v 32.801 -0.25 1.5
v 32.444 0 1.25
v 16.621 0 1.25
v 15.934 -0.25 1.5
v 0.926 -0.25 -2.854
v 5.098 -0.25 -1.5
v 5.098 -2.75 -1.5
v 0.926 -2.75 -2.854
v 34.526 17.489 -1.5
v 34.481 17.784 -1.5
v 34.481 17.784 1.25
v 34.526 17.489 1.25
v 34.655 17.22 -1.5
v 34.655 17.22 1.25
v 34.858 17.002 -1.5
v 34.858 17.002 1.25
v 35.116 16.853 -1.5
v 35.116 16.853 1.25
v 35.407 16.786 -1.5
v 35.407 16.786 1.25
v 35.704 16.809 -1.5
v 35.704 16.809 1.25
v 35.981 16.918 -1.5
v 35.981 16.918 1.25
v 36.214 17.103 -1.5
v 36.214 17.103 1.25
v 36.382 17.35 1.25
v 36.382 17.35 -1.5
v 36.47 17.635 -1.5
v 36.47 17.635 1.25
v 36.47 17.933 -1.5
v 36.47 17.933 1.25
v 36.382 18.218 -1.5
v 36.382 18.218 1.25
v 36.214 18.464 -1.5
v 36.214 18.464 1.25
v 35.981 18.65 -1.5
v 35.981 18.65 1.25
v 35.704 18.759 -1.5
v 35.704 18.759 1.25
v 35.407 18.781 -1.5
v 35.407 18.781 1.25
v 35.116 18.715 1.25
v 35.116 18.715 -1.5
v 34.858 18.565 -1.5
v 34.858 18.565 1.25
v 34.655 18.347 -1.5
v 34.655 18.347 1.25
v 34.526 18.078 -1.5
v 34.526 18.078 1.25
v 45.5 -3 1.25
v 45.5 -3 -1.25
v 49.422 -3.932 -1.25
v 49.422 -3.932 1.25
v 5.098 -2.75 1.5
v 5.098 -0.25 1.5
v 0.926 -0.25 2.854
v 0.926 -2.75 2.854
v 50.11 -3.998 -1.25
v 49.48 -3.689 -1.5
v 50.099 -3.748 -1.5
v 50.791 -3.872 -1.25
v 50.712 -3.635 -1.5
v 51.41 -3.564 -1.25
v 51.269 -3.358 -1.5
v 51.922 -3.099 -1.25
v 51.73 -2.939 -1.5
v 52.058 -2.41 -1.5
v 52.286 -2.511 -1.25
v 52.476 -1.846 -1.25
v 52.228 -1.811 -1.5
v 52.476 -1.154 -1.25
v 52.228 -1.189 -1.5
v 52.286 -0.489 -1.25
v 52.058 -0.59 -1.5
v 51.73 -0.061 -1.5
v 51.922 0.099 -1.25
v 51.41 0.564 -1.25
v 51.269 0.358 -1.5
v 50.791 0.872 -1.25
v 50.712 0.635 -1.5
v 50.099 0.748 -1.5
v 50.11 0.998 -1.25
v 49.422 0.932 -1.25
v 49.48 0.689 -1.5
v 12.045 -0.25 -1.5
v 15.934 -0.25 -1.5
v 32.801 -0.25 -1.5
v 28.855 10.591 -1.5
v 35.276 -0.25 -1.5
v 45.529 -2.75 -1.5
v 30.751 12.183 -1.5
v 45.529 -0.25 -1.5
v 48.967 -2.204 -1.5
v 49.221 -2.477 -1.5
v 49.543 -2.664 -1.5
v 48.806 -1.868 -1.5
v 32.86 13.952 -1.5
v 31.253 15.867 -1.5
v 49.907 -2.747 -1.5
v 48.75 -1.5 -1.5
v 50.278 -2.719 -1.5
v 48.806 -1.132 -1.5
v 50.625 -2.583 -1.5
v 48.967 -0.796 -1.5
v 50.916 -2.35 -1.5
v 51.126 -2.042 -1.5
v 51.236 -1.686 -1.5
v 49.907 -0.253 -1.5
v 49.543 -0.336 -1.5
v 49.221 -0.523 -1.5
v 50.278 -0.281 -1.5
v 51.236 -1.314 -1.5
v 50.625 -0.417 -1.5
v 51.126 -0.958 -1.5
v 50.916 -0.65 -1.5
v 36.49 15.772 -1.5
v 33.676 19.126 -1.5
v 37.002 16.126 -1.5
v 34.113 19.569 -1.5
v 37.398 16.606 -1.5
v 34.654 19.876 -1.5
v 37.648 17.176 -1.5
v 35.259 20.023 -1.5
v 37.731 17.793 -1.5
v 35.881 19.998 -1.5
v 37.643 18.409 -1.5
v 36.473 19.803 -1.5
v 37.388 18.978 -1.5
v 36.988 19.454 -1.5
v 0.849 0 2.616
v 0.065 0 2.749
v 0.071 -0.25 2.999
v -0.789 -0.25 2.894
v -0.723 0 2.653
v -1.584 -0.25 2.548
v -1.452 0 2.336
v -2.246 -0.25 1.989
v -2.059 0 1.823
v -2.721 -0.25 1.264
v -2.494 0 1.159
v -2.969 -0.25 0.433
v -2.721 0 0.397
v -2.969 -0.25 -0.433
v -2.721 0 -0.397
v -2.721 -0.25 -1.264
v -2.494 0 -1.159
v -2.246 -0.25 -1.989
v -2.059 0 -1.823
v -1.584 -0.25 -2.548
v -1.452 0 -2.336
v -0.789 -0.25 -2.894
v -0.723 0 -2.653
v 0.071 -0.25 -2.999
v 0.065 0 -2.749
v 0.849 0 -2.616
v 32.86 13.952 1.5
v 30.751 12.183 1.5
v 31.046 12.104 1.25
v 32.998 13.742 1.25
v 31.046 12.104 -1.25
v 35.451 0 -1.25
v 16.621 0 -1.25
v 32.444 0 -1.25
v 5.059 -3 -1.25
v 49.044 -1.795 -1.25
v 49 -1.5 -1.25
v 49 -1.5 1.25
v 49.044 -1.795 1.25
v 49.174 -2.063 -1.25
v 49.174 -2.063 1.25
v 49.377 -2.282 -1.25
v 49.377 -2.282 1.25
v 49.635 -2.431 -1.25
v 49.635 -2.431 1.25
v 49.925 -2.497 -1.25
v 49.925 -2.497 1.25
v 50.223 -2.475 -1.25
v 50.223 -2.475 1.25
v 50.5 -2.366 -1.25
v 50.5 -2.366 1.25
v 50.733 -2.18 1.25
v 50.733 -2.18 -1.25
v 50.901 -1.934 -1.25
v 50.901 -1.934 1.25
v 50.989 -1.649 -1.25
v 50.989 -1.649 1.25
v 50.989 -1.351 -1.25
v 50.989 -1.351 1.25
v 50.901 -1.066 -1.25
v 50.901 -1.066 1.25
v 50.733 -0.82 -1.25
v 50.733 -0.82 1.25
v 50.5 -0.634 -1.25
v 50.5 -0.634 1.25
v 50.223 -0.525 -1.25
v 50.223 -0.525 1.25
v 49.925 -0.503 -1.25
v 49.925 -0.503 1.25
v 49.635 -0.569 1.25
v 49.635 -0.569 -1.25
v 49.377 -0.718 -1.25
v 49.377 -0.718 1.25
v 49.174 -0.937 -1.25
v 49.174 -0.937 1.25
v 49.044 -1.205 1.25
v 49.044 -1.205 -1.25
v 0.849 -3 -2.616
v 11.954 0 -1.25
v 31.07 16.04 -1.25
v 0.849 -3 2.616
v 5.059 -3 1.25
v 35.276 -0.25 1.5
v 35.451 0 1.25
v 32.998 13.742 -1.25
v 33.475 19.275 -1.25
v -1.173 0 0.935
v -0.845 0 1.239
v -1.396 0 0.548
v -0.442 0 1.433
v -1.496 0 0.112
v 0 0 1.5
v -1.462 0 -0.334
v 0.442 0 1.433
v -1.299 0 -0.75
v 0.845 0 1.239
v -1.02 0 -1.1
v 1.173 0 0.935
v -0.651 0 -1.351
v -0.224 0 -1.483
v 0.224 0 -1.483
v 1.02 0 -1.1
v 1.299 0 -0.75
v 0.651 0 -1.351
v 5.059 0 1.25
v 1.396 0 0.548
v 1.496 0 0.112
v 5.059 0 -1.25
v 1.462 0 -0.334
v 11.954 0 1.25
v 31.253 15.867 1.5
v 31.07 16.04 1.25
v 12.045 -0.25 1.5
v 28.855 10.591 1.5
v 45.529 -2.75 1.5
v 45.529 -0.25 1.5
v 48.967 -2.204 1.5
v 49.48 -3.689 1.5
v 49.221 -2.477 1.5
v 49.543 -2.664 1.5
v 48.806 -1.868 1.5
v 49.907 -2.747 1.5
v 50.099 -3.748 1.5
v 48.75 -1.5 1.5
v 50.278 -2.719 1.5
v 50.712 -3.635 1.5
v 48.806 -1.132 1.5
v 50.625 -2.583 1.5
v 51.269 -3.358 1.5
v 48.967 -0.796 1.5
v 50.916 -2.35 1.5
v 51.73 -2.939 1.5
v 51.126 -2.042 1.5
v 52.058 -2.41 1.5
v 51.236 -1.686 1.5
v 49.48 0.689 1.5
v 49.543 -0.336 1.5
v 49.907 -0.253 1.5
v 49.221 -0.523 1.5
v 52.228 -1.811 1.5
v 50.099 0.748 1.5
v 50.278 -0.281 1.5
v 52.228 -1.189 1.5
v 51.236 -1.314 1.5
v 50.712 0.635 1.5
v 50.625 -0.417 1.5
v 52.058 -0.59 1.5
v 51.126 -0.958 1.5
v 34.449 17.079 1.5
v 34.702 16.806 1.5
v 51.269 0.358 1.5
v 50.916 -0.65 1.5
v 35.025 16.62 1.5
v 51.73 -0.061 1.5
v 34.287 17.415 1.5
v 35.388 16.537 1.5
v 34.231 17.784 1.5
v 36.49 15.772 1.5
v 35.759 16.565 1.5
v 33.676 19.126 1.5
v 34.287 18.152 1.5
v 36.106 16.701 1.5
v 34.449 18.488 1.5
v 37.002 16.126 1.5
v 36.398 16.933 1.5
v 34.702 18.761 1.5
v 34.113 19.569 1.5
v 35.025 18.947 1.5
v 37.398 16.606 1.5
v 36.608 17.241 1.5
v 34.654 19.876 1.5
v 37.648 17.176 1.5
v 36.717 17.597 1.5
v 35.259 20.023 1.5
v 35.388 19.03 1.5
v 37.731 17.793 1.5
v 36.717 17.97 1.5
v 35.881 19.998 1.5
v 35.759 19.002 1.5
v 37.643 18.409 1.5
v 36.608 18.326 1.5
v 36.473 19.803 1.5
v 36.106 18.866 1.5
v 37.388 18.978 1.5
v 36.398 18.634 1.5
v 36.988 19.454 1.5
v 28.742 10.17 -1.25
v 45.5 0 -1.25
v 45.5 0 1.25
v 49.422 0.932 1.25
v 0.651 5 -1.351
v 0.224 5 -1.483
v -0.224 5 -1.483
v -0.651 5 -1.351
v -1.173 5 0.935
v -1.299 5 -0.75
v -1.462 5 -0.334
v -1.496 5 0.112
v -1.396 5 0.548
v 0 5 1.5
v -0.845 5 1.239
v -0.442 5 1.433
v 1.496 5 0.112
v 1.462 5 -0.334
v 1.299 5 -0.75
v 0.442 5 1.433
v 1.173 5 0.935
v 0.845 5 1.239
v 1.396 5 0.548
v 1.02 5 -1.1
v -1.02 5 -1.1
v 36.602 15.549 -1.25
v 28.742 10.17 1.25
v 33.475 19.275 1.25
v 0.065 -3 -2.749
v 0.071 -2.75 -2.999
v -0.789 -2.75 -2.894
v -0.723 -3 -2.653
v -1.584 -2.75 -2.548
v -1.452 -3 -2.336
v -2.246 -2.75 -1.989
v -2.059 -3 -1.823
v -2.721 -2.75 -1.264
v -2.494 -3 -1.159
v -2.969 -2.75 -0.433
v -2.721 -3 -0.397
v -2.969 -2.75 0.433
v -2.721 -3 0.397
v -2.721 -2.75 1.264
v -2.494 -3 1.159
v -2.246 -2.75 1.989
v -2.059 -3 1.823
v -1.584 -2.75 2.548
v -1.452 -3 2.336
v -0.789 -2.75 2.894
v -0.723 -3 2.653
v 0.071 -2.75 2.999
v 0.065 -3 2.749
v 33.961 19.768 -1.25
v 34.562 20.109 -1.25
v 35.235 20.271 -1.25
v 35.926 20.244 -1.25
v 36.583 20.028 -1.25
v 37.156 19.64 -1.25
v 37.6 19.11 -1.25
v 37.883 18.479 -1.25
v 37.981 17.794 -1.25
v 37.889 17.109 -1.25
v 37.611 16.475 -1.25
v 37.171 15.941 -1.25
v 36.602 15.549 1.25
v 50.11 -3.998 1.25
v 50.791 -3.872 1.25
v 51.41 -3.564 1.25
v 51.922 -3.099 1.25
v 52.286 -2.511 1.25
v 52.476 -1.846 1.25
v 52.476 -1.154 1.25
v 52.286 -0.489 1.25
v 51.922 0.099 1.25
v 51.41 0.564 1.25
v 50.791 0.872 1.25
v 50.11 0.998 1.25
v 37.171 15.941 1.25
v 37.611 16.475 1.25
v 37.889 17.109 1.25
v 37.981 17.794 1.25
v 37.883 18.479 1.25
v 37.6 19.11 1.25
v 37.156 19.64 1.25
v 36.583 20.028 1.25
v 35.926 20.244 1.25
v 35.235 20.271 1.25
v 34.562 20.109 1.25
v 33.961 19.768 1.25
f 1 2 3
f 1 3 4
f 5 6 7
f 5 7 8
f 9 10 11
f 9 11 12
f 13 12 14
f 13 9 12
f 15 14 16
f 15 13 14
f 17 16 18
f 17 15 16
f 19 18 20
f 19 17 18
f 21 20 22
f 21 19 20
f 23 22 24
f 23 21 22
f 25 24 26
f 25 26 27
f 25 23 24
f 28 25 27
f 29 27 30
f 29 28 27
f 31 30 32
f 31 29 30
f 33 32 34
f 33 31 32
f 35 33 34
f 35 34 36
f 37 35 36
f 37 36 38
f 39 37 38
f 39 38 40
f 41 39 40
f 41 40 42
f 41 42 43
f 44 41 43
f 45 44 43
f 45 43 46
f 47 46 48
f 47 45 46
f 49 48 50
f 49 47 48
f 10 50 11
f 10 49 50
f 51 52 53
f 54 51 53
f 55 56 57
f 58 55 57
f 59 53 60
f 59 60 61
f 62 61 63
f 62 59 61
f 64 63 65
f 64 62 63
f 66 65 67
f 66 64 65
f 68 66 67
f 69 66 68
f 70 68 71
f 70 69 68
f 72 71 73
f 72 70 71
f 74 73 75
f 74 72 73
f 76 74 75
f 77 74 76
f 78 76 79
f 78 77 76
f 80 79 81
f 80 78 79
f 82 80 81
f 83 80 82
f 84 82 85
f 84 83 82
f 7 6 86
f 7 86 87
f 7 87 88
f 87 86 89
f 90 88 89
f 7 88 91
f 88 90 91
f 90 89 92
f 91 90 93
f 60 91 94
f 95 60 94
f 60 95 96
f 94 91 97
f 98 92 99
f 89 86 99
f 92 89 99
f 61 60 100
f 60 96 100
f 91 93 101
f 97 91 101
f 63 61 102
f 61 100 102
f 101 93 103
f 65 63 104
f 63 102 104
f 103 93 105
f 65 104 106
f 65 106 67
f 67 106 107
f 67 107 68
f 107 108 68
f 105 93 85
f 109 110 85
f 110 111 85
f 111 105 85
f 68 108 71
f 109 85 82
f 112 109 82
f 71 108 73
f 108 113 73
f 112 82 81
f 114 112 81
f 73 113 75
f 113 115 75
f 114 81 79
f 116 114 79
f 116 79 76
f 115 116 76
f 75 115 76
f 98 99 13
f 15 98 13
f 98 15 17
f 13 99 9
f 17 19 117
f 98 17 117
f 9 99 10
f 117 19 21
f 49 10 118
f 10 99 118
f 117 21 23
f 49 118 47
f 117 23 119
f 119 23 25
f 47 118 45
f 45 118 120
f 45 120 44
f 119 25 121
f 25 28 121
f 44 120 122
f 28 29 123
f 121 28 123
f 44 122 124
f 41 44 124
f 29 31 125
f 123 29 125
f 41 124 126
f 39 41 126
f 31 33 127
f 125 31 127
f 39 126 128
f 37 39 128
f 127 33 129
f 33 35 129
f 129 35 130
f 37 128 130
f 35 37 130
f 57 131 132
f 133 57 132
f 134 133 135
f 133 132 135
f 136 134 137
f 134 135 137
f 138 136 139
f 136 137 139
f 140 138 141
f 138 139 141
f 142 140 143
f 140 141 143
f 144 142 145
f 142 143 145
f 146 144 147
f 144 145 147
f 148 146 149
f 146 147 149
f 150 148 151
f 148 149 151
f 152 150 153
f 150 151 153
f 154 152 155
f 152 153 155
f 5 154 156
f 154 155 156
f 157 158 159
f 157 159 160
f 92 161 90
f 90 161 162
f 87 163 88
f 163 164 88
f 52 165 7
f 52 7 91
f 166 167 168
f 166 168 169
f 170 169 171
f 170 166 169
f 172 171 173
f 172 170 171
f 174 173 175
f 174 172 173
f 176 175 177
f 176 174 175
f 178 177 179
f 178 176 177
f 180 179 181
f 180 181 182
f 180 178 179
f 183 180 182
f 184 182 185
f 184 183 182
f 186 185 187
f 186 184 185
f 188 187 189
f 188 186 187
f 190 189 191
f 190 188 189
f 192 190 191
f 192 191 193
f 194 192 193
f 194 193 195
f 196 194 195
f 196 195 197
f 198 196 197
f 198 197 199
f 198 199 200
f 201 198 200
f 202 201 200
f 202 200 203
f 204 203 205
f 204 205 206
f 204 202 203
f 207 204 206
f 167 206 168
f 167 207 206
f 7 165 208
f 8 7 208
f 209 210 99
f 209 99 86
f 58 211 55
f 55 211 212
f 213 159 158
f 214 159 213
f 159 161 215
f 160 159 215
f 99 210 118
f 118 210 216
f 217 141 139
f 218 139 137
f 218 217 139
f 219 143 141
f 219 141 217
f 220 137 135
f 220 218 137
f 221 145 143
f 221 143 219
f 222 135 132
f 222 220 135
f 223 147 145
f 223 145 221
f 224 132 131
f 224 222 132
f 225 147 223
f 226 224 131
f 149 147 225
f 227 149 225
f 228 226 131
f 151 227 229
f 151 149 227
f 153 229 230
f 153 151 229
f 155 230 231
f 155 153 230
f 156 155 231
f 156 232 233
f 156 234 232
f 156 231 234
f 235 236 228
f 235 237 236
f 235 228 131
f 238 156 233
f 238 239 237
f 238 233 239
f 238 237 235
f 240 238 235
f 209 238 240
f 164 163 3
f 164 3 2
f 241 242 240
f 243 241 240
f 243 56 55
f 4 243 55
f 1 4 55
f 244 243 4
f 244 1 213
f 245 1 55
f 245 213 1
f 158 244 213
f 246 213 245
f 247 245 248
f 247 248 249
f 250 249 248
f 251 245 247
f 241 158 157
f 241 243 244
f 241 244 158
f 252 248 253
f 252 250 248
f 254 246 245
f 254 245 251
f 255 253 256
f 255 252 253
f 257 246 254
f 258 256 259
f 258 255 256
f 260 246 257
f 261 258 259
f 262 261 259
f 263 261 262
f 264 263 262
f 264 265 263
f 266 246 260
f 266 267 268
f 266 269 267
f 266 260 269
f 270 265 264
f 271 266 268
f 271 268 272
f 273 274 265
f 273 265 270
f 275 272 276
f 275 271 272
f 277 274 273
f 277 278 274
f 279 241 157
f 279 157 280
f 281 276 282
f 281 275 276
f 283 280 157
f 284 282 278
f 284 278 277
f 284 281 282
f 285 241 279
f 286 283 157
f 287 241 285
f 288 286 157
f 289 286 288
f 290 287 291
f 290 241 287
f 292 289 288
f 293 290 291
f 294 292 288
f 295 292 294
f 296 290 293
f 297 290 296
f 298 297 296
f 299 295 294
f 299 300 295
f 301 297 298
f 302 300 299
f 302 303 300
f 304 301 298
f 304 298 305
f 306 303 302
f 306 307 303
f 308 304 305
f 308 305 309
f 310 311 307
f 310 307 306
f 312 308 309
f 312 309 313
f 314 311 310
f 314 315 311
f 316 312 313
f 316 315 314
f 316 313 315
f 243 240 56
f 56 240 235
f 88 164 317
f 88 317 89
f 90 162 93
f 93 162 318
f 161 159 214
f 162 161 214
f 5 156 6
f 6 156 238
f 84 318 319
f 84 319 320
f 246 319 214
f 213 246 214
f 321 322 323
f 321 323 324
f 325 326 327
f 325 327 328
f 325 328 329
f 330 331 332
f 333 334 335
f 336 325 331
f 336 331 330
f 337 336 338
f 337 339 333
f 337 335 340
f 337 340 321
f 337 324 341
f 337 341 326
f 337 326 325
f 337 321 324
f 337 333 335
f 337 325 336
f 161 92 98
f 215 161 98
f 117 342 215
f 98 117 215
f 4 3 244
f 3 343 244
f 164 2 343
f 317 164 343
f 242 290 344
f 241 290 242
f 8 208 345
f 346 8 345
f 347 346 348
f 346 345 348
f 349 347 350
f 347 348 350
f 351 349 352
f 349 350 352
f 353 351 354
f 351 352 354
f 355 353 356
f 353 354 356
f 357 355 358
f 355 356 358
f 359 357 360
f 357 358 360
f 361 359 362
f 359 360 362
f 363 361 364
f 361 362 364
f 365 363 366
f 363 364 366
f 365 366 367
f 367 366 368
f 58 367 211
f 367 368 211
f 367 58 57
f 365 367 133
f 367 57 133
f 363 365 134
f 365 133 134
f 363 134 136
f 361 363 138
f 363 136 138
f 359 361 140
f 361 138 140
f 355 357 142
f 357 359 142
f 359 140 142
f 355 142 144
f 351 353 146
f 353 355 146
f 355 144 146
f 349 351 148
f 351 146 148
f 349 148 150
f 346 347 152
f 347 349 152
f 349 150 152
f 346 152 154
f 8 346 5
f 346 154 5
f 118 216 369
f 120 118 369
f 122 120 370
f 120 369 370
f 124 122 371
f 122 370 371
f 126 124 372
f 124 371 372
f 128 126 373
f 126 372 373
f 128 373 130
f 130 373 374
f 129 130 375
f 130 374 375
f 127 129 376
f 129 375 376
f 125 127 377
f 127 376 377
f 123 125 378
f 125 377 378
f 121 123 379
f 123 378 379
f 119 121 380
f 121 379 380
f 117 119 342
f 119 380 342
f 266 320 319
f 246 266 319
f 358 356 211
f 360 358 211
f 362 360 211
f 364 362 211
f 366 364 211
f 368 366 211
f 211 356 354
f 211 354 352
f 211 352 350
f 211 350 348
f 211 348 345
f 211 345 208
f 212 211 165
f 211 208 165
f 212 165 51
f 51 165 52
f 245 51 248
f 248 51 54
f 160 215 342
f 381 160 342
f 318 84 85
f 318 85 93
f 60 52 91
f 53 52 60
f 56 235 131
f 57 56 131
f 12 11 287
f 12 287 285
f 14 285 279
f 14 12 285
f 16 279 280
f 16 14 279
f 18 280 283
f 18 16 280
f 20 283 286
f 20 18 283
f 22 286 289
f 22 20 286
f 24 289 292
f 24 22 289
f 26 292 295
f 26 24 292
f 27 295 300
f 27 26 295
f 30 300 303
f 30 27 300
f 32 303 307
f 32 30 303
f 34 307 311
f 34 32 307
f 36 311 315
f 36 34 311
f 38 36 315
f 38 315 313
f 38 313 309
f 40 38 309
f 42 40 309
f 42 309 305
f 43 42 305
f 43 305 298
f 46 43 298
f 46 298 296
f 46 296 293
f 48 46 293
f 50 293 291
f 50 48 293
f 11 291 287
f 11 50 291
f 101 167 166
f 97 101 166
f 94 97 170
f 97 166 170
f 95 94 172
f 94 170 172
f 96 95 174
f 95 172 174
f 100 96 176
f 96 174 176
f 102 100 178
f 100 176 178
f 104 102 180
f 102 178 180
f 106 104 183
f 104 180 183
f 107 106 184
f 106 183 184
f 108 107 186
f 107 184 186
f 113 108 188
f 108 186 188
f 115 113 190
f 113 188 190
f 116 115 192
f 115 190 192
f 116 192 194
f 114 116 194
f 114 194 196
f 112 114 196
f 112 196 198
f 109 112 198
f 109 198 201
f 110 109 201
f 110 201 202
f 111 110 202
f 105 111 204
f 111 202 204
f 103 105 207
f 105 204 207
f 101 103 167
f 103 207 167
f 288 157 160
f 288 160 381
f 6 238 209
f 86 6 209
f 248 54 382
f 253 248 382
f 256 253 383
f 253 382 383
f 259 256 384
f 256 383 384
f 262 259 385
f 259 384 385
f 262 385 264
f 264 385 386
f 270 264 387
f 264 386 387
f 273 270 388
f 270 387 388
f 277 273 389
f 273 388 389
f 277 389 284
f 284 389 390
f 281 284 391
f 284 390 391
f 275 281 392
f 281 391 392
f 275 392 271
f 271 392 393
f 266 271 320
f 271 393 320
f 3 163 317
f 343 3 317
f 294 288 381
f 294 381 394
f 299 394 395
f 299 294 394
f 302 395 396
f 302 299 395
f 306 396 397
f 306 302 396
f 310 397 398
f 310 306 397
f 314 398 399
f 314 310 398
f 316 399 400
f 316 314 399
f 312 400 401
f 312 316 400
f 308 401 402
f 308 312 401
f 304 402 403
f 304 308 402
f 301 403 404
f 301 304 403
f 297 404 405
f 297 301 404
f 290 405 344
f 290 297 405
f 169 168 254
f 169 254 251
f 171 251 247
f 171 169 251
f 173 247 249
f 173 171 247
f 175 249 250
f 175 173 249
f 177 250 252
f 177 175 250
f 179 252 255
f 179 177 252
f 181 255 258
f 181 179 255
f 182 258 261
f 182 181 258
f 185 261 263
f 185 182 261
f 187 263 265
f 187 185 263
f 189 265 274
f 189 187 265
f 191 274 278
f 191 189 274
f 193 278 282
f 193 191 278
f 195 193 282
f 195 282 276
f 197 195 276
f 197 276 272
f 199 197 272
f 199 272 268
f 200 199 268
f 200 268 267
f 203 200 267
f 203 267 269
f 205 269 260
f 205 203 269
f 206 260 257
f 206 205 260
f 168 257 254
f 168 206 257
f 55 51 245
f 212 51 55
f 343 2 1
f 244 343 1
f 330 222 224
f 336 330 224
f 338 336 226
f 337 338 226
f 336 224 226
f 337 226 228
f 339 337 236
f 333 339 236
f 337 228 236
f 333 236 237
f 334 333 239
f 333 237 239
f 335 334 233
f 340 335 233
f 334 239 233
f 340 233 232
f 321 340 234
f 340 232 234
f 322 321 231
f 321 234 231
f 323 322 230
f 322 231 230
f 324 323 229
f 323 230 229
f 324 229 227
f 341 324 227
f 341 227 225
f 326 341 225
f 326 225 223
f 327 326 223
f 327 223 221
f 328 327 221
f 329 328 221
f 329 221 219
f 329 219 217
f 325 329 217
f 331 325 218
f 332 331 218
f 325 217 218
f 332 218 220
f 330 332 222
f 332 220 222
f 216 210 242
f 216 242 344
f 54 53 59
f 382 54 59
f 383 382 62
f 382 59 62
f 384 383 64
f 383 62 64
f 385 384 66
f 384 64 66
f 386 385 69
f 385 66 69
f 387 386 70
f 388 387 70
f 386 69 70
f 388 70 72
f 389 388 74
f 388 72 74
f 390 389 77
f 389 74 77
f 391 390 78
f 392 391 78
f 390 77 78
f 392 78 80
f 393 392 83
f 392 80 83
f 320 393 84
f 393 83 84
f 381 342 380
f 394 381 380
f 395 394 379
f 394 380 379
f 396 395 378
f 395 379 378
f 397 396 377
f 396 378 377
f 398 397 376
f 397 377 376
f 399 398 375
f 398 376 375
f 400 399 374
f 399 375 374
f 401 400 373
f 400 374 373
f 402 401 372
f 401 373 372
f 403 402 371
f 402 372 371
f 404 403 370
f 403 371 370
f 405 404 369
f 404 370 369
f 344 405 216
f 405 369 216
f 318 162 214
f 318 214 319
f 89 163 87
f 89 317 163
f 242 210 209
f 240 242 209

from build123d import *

# Parameters (mm, degrees)
SKETCH_1_R          = 1.5
EXTRUDE_1_DEPTH     = 5
EXTRUDE_2_DEPTH     = 3
EXTRUDE_START       = -1.5
SKETCH_3_R          = 2.5
EXTRUDE_3_DEPTH     = 3
CUT_EXTRUDE_START   = -1.5
SKETCH_4_R          = 1
CUT_EXTRUDE_1_DEPTH = 3
EXTRUDE_4_DEPTH     = 3
EXTRUDE_5_DEPTH     = 3
SKETCH_9_R          = 1
EXTRUDE_6_DEPTH     = 3
EXTRUDE_7_DEPTH     = 3
EXTRUDE_START_2     = 1.5
EXTRUDE_8_DEPTH     = 3
CHAMFER_5_SIZE      = 0.25
CHAMFER_6_SIZE      = 0.25


with BuildPart() as part:
    # 草图1 → 凸台-拉伸1 (new body)
    with BuildSketch(Plane(origin=(0, 0, 0), x_dir=(1, 0, 0), z_dir=(0, 1, 0))):
        with Locations(Location((0, 0, 0), (0, 0, 270))):
            Circle(SKETCH_1_R)
    extrude(amount=EXTRUDE_1_DEPTH)

    # 草图2 → 凸台-拉伸2 (add)
    with BuildSketch(Plane(origin=(0, 0, 0), x_dir=(1, 0, 0), z_dir=(0, 1, 0))):
        with BuildLine():
            Line((50, 1.5), (50, -1.5))
            Line((50, -1.5), (2.598076211, -1.5))
            ThreePointArc((2.598076211, -1.5), (-3, 0), (2.598076211, 1.5))
            Line((2.598076211, 1.5), (50, 1.5))
        make_face()
    extrude(amount=-EXTRUDE_2_DEPTH)

    # 草图3 → 凸台-拉伸3 (add)
    with BuildSketch(Plane.XY.offset(EXTRUDE_START)):
        with Locations((50, -1.5)):
            Circle(SKETCH_3_R)
    extrude(amount=EXTRUDE_3_DEPTH)

    # 草图4 → 切除-拉伸1 (cut)
    with BuildSketch(Plane.XY.offset(CUT_EXTRUDE_START)):
        with Locations(Location((50, -1.5, 0), (0, 0, 180))):
            Circle(SKETCH_4_R)
    extrude(amount=CUT_EXTRUDE_1_DEPTH, mode=Mode.SUBTRACT)

    # 草图5 → 凸台-拉伸4 (add)
    with BuildSketch(Plane(origin=(0, 0, 0), x_dir=(1, 0, 0), z_dir=(0, 1, 0))):
        with BuildLine():
            Line((5.098076211, 1.5), (0.925764755, 2.853587149))
            ThreePointArc((0.925764755, 2.853587149), (1.88743565, 2.331863347), (2.598076211, 1.5))
            Line((2.598076211, 1.5), (5.098076211, 1.5))
        make_face()
        with BuildLine():
            Line((5.098076211, -1.5), (0.925764755, -2.853587149))
            ThreePointArc((0.925764755, -2.853587149), (1.88743565, -2.331863347), (2.598076211, -1.5))
            Line((2.598076211, -1.5), (5.098076211, -1.5))
        make_face()
    extrude(amount=-EXTRUDE_4_DEPTH)

    # 草图6 → 凸台-拉伸5 (add)
    with BuildSketch(Plane.XY.offset(EXTRUDE_START)):
        with BuildLine():
            Line((45.5, 0), (49.421854812, 0.932231104))
            ThreePointArc((49.421854812, 0.932231104), (48.629244055, 0.590700395), (48, 0))
            Line((48, 0), (45.5, 0))
        make_face()
        with BuildLine():
            Line((45.5, -3), (49.421854812, -3.932231104))
            ThreePointArc((49.421854812, -3.932231104), (48.629244055, -3.590700395), (48, -3))
            Line((48, -3), (45.5, -3))
        make_face()
    extrude(amount=EXTRUDE_5_DEPTH)

    # 草图9 → 凸台-拉伸6 (add)
    with BuildSketch(Plane.XY.offset(EXTRUDE_START)):
        with BuildLine():
            Line((16.621216129, 0), (34.913425822, 15.348986407))
            ThreePointArc((34.913425822, 15.348986407), (37.396444401, 19.390597315), (32.985062993, 17.647119736))
            Line((32.985062993, 17.647119736), (11.954044649, 0))
            Line((11.954044649, 0), (16.621216129, 0))
        make_face()
        with Locations(Location((35.481333294, 17.783628291, 0), (0, 0, 180))):
            Circle(SKETCH_9_R, mode=Mode.SUBTRACT)
    extrude(amount=EXTRUDE_6_DEPTH)

    # 草图10 → 凸台-拉伸7 (add)
    with BuildSketch(Plane.XY.offset(EXTRUDE_START)):
        with BuildLine():
            Line((32.998314714, 13.742017382), (36.601856403, 15.548806606))
            ThreePointArc((36.601856403, 15.548806606), (35.775149629, 15.300953934), (34.913425822, 15.348986407))
            Line((34.913425822, 15.348986407), (32.998314714, 13.742017382))
        make_face()
        with BuildLine():
            Line((31.069951885, 16.040150712), (33.475040368, 19.275200849))
            ThreePointArc((33.475040368, 19.275200849), (33.08739701, 18.504092773), (32.985062993, 17.647119736))
            Line((32.985062993, 17.647119736), (31.069951885, 16.040150712))
        make_face()
    extrude(amount=EXTRUDE_7_DEPTH)

    # 草图11 → 凸台-拉伸8 (add)
    with BuildSketch(Plane.XY.offset(EXTRUDE_START_2)):
        Polygon((31.045694114, 12.103574157), (35.451034835, 0), (32.443670675, 0), (28.741919511, 10.170477737), align=None)
    extrude(amount=-EXTRUDE_8_DEPTH)

    # 倒角5
    chamfer_5_edges = [part.edges().sort_by_distance(p)[0] for p in [
        (37.396444401, 19.390597315, 1.5),
        (32.272496126, 17.65767578, -1.5),
        (32.272496126, 17.65767578, 1.5),
        (22.68156782, 5.085238868, 1.5),
        (22.68156782, 5.085238868, -1.5),
        (40.475517418, 0, 1.5),
        (24.532443402, 0, -1.5),
        (30.592795093, 5.085238868, 1.5),
        (33.248364474, 6.051787078, 1.5),
        (30.592795093, 5.085238868, -1.5),
        (33.248364474, 6.051787078, -1.5),
        (51, -1.5, -1.5),
        (51, -1.5, 1.5),
        (8.52606043, 0, 1.5),
        (25.299038106, -3, 1.5),
        (25.299038106, -3, -1.5),
        (47.460927406, -3.466115552, -1.5),
        (47.460927406, -3.466115552, 1.5),
        (52.5, -1.5, -1.5),
        (52.5, -1.5, 1.5),
        (40.475517418, 0, -1.5),
        (47.460927406, 0.466115552, -1.5),
        (47.460927406, 0.466115552, 1.5),
        (8.52606043, 0, -1.5),
        (24.532443402, 0, 1.5),
        (21.511998267, 8.020075356, 1.5),
        (21.511998267, 8.020075356, -1.5),
        (36.481333294, 17.783628291, 1.5),
        (32.022004414, 12.92279577, 1.5),
        (32.022004414, 12.92279577, -1.5),
        (34.800085558, 14.645411994, -1.5),
        (34.800085558, 14.645411994, 1.5),
        (37.396444401, 19.390597315, -1.5),
    ]]
    chamfer(chamfer_5_edges, length=CHAMFER_5_SIZE)

    # 倒角6
    chamfer_6_edges = [part.edges().sort_by_distance(p)[0] for p in [
        (3.397221816, 0, -2.051793575),
        (3.397221816, 0, 2.051793575),
        (-3, 0, 0),
        (3.397221816, -3, -2.051793575),
        (3.397221816, -3, 2.051793575),
        (-3, -3, 0),
    ]]
    chamfer(chamfer_6_edges, length=CHAMFER_6_SIZE)


solid = part.part
